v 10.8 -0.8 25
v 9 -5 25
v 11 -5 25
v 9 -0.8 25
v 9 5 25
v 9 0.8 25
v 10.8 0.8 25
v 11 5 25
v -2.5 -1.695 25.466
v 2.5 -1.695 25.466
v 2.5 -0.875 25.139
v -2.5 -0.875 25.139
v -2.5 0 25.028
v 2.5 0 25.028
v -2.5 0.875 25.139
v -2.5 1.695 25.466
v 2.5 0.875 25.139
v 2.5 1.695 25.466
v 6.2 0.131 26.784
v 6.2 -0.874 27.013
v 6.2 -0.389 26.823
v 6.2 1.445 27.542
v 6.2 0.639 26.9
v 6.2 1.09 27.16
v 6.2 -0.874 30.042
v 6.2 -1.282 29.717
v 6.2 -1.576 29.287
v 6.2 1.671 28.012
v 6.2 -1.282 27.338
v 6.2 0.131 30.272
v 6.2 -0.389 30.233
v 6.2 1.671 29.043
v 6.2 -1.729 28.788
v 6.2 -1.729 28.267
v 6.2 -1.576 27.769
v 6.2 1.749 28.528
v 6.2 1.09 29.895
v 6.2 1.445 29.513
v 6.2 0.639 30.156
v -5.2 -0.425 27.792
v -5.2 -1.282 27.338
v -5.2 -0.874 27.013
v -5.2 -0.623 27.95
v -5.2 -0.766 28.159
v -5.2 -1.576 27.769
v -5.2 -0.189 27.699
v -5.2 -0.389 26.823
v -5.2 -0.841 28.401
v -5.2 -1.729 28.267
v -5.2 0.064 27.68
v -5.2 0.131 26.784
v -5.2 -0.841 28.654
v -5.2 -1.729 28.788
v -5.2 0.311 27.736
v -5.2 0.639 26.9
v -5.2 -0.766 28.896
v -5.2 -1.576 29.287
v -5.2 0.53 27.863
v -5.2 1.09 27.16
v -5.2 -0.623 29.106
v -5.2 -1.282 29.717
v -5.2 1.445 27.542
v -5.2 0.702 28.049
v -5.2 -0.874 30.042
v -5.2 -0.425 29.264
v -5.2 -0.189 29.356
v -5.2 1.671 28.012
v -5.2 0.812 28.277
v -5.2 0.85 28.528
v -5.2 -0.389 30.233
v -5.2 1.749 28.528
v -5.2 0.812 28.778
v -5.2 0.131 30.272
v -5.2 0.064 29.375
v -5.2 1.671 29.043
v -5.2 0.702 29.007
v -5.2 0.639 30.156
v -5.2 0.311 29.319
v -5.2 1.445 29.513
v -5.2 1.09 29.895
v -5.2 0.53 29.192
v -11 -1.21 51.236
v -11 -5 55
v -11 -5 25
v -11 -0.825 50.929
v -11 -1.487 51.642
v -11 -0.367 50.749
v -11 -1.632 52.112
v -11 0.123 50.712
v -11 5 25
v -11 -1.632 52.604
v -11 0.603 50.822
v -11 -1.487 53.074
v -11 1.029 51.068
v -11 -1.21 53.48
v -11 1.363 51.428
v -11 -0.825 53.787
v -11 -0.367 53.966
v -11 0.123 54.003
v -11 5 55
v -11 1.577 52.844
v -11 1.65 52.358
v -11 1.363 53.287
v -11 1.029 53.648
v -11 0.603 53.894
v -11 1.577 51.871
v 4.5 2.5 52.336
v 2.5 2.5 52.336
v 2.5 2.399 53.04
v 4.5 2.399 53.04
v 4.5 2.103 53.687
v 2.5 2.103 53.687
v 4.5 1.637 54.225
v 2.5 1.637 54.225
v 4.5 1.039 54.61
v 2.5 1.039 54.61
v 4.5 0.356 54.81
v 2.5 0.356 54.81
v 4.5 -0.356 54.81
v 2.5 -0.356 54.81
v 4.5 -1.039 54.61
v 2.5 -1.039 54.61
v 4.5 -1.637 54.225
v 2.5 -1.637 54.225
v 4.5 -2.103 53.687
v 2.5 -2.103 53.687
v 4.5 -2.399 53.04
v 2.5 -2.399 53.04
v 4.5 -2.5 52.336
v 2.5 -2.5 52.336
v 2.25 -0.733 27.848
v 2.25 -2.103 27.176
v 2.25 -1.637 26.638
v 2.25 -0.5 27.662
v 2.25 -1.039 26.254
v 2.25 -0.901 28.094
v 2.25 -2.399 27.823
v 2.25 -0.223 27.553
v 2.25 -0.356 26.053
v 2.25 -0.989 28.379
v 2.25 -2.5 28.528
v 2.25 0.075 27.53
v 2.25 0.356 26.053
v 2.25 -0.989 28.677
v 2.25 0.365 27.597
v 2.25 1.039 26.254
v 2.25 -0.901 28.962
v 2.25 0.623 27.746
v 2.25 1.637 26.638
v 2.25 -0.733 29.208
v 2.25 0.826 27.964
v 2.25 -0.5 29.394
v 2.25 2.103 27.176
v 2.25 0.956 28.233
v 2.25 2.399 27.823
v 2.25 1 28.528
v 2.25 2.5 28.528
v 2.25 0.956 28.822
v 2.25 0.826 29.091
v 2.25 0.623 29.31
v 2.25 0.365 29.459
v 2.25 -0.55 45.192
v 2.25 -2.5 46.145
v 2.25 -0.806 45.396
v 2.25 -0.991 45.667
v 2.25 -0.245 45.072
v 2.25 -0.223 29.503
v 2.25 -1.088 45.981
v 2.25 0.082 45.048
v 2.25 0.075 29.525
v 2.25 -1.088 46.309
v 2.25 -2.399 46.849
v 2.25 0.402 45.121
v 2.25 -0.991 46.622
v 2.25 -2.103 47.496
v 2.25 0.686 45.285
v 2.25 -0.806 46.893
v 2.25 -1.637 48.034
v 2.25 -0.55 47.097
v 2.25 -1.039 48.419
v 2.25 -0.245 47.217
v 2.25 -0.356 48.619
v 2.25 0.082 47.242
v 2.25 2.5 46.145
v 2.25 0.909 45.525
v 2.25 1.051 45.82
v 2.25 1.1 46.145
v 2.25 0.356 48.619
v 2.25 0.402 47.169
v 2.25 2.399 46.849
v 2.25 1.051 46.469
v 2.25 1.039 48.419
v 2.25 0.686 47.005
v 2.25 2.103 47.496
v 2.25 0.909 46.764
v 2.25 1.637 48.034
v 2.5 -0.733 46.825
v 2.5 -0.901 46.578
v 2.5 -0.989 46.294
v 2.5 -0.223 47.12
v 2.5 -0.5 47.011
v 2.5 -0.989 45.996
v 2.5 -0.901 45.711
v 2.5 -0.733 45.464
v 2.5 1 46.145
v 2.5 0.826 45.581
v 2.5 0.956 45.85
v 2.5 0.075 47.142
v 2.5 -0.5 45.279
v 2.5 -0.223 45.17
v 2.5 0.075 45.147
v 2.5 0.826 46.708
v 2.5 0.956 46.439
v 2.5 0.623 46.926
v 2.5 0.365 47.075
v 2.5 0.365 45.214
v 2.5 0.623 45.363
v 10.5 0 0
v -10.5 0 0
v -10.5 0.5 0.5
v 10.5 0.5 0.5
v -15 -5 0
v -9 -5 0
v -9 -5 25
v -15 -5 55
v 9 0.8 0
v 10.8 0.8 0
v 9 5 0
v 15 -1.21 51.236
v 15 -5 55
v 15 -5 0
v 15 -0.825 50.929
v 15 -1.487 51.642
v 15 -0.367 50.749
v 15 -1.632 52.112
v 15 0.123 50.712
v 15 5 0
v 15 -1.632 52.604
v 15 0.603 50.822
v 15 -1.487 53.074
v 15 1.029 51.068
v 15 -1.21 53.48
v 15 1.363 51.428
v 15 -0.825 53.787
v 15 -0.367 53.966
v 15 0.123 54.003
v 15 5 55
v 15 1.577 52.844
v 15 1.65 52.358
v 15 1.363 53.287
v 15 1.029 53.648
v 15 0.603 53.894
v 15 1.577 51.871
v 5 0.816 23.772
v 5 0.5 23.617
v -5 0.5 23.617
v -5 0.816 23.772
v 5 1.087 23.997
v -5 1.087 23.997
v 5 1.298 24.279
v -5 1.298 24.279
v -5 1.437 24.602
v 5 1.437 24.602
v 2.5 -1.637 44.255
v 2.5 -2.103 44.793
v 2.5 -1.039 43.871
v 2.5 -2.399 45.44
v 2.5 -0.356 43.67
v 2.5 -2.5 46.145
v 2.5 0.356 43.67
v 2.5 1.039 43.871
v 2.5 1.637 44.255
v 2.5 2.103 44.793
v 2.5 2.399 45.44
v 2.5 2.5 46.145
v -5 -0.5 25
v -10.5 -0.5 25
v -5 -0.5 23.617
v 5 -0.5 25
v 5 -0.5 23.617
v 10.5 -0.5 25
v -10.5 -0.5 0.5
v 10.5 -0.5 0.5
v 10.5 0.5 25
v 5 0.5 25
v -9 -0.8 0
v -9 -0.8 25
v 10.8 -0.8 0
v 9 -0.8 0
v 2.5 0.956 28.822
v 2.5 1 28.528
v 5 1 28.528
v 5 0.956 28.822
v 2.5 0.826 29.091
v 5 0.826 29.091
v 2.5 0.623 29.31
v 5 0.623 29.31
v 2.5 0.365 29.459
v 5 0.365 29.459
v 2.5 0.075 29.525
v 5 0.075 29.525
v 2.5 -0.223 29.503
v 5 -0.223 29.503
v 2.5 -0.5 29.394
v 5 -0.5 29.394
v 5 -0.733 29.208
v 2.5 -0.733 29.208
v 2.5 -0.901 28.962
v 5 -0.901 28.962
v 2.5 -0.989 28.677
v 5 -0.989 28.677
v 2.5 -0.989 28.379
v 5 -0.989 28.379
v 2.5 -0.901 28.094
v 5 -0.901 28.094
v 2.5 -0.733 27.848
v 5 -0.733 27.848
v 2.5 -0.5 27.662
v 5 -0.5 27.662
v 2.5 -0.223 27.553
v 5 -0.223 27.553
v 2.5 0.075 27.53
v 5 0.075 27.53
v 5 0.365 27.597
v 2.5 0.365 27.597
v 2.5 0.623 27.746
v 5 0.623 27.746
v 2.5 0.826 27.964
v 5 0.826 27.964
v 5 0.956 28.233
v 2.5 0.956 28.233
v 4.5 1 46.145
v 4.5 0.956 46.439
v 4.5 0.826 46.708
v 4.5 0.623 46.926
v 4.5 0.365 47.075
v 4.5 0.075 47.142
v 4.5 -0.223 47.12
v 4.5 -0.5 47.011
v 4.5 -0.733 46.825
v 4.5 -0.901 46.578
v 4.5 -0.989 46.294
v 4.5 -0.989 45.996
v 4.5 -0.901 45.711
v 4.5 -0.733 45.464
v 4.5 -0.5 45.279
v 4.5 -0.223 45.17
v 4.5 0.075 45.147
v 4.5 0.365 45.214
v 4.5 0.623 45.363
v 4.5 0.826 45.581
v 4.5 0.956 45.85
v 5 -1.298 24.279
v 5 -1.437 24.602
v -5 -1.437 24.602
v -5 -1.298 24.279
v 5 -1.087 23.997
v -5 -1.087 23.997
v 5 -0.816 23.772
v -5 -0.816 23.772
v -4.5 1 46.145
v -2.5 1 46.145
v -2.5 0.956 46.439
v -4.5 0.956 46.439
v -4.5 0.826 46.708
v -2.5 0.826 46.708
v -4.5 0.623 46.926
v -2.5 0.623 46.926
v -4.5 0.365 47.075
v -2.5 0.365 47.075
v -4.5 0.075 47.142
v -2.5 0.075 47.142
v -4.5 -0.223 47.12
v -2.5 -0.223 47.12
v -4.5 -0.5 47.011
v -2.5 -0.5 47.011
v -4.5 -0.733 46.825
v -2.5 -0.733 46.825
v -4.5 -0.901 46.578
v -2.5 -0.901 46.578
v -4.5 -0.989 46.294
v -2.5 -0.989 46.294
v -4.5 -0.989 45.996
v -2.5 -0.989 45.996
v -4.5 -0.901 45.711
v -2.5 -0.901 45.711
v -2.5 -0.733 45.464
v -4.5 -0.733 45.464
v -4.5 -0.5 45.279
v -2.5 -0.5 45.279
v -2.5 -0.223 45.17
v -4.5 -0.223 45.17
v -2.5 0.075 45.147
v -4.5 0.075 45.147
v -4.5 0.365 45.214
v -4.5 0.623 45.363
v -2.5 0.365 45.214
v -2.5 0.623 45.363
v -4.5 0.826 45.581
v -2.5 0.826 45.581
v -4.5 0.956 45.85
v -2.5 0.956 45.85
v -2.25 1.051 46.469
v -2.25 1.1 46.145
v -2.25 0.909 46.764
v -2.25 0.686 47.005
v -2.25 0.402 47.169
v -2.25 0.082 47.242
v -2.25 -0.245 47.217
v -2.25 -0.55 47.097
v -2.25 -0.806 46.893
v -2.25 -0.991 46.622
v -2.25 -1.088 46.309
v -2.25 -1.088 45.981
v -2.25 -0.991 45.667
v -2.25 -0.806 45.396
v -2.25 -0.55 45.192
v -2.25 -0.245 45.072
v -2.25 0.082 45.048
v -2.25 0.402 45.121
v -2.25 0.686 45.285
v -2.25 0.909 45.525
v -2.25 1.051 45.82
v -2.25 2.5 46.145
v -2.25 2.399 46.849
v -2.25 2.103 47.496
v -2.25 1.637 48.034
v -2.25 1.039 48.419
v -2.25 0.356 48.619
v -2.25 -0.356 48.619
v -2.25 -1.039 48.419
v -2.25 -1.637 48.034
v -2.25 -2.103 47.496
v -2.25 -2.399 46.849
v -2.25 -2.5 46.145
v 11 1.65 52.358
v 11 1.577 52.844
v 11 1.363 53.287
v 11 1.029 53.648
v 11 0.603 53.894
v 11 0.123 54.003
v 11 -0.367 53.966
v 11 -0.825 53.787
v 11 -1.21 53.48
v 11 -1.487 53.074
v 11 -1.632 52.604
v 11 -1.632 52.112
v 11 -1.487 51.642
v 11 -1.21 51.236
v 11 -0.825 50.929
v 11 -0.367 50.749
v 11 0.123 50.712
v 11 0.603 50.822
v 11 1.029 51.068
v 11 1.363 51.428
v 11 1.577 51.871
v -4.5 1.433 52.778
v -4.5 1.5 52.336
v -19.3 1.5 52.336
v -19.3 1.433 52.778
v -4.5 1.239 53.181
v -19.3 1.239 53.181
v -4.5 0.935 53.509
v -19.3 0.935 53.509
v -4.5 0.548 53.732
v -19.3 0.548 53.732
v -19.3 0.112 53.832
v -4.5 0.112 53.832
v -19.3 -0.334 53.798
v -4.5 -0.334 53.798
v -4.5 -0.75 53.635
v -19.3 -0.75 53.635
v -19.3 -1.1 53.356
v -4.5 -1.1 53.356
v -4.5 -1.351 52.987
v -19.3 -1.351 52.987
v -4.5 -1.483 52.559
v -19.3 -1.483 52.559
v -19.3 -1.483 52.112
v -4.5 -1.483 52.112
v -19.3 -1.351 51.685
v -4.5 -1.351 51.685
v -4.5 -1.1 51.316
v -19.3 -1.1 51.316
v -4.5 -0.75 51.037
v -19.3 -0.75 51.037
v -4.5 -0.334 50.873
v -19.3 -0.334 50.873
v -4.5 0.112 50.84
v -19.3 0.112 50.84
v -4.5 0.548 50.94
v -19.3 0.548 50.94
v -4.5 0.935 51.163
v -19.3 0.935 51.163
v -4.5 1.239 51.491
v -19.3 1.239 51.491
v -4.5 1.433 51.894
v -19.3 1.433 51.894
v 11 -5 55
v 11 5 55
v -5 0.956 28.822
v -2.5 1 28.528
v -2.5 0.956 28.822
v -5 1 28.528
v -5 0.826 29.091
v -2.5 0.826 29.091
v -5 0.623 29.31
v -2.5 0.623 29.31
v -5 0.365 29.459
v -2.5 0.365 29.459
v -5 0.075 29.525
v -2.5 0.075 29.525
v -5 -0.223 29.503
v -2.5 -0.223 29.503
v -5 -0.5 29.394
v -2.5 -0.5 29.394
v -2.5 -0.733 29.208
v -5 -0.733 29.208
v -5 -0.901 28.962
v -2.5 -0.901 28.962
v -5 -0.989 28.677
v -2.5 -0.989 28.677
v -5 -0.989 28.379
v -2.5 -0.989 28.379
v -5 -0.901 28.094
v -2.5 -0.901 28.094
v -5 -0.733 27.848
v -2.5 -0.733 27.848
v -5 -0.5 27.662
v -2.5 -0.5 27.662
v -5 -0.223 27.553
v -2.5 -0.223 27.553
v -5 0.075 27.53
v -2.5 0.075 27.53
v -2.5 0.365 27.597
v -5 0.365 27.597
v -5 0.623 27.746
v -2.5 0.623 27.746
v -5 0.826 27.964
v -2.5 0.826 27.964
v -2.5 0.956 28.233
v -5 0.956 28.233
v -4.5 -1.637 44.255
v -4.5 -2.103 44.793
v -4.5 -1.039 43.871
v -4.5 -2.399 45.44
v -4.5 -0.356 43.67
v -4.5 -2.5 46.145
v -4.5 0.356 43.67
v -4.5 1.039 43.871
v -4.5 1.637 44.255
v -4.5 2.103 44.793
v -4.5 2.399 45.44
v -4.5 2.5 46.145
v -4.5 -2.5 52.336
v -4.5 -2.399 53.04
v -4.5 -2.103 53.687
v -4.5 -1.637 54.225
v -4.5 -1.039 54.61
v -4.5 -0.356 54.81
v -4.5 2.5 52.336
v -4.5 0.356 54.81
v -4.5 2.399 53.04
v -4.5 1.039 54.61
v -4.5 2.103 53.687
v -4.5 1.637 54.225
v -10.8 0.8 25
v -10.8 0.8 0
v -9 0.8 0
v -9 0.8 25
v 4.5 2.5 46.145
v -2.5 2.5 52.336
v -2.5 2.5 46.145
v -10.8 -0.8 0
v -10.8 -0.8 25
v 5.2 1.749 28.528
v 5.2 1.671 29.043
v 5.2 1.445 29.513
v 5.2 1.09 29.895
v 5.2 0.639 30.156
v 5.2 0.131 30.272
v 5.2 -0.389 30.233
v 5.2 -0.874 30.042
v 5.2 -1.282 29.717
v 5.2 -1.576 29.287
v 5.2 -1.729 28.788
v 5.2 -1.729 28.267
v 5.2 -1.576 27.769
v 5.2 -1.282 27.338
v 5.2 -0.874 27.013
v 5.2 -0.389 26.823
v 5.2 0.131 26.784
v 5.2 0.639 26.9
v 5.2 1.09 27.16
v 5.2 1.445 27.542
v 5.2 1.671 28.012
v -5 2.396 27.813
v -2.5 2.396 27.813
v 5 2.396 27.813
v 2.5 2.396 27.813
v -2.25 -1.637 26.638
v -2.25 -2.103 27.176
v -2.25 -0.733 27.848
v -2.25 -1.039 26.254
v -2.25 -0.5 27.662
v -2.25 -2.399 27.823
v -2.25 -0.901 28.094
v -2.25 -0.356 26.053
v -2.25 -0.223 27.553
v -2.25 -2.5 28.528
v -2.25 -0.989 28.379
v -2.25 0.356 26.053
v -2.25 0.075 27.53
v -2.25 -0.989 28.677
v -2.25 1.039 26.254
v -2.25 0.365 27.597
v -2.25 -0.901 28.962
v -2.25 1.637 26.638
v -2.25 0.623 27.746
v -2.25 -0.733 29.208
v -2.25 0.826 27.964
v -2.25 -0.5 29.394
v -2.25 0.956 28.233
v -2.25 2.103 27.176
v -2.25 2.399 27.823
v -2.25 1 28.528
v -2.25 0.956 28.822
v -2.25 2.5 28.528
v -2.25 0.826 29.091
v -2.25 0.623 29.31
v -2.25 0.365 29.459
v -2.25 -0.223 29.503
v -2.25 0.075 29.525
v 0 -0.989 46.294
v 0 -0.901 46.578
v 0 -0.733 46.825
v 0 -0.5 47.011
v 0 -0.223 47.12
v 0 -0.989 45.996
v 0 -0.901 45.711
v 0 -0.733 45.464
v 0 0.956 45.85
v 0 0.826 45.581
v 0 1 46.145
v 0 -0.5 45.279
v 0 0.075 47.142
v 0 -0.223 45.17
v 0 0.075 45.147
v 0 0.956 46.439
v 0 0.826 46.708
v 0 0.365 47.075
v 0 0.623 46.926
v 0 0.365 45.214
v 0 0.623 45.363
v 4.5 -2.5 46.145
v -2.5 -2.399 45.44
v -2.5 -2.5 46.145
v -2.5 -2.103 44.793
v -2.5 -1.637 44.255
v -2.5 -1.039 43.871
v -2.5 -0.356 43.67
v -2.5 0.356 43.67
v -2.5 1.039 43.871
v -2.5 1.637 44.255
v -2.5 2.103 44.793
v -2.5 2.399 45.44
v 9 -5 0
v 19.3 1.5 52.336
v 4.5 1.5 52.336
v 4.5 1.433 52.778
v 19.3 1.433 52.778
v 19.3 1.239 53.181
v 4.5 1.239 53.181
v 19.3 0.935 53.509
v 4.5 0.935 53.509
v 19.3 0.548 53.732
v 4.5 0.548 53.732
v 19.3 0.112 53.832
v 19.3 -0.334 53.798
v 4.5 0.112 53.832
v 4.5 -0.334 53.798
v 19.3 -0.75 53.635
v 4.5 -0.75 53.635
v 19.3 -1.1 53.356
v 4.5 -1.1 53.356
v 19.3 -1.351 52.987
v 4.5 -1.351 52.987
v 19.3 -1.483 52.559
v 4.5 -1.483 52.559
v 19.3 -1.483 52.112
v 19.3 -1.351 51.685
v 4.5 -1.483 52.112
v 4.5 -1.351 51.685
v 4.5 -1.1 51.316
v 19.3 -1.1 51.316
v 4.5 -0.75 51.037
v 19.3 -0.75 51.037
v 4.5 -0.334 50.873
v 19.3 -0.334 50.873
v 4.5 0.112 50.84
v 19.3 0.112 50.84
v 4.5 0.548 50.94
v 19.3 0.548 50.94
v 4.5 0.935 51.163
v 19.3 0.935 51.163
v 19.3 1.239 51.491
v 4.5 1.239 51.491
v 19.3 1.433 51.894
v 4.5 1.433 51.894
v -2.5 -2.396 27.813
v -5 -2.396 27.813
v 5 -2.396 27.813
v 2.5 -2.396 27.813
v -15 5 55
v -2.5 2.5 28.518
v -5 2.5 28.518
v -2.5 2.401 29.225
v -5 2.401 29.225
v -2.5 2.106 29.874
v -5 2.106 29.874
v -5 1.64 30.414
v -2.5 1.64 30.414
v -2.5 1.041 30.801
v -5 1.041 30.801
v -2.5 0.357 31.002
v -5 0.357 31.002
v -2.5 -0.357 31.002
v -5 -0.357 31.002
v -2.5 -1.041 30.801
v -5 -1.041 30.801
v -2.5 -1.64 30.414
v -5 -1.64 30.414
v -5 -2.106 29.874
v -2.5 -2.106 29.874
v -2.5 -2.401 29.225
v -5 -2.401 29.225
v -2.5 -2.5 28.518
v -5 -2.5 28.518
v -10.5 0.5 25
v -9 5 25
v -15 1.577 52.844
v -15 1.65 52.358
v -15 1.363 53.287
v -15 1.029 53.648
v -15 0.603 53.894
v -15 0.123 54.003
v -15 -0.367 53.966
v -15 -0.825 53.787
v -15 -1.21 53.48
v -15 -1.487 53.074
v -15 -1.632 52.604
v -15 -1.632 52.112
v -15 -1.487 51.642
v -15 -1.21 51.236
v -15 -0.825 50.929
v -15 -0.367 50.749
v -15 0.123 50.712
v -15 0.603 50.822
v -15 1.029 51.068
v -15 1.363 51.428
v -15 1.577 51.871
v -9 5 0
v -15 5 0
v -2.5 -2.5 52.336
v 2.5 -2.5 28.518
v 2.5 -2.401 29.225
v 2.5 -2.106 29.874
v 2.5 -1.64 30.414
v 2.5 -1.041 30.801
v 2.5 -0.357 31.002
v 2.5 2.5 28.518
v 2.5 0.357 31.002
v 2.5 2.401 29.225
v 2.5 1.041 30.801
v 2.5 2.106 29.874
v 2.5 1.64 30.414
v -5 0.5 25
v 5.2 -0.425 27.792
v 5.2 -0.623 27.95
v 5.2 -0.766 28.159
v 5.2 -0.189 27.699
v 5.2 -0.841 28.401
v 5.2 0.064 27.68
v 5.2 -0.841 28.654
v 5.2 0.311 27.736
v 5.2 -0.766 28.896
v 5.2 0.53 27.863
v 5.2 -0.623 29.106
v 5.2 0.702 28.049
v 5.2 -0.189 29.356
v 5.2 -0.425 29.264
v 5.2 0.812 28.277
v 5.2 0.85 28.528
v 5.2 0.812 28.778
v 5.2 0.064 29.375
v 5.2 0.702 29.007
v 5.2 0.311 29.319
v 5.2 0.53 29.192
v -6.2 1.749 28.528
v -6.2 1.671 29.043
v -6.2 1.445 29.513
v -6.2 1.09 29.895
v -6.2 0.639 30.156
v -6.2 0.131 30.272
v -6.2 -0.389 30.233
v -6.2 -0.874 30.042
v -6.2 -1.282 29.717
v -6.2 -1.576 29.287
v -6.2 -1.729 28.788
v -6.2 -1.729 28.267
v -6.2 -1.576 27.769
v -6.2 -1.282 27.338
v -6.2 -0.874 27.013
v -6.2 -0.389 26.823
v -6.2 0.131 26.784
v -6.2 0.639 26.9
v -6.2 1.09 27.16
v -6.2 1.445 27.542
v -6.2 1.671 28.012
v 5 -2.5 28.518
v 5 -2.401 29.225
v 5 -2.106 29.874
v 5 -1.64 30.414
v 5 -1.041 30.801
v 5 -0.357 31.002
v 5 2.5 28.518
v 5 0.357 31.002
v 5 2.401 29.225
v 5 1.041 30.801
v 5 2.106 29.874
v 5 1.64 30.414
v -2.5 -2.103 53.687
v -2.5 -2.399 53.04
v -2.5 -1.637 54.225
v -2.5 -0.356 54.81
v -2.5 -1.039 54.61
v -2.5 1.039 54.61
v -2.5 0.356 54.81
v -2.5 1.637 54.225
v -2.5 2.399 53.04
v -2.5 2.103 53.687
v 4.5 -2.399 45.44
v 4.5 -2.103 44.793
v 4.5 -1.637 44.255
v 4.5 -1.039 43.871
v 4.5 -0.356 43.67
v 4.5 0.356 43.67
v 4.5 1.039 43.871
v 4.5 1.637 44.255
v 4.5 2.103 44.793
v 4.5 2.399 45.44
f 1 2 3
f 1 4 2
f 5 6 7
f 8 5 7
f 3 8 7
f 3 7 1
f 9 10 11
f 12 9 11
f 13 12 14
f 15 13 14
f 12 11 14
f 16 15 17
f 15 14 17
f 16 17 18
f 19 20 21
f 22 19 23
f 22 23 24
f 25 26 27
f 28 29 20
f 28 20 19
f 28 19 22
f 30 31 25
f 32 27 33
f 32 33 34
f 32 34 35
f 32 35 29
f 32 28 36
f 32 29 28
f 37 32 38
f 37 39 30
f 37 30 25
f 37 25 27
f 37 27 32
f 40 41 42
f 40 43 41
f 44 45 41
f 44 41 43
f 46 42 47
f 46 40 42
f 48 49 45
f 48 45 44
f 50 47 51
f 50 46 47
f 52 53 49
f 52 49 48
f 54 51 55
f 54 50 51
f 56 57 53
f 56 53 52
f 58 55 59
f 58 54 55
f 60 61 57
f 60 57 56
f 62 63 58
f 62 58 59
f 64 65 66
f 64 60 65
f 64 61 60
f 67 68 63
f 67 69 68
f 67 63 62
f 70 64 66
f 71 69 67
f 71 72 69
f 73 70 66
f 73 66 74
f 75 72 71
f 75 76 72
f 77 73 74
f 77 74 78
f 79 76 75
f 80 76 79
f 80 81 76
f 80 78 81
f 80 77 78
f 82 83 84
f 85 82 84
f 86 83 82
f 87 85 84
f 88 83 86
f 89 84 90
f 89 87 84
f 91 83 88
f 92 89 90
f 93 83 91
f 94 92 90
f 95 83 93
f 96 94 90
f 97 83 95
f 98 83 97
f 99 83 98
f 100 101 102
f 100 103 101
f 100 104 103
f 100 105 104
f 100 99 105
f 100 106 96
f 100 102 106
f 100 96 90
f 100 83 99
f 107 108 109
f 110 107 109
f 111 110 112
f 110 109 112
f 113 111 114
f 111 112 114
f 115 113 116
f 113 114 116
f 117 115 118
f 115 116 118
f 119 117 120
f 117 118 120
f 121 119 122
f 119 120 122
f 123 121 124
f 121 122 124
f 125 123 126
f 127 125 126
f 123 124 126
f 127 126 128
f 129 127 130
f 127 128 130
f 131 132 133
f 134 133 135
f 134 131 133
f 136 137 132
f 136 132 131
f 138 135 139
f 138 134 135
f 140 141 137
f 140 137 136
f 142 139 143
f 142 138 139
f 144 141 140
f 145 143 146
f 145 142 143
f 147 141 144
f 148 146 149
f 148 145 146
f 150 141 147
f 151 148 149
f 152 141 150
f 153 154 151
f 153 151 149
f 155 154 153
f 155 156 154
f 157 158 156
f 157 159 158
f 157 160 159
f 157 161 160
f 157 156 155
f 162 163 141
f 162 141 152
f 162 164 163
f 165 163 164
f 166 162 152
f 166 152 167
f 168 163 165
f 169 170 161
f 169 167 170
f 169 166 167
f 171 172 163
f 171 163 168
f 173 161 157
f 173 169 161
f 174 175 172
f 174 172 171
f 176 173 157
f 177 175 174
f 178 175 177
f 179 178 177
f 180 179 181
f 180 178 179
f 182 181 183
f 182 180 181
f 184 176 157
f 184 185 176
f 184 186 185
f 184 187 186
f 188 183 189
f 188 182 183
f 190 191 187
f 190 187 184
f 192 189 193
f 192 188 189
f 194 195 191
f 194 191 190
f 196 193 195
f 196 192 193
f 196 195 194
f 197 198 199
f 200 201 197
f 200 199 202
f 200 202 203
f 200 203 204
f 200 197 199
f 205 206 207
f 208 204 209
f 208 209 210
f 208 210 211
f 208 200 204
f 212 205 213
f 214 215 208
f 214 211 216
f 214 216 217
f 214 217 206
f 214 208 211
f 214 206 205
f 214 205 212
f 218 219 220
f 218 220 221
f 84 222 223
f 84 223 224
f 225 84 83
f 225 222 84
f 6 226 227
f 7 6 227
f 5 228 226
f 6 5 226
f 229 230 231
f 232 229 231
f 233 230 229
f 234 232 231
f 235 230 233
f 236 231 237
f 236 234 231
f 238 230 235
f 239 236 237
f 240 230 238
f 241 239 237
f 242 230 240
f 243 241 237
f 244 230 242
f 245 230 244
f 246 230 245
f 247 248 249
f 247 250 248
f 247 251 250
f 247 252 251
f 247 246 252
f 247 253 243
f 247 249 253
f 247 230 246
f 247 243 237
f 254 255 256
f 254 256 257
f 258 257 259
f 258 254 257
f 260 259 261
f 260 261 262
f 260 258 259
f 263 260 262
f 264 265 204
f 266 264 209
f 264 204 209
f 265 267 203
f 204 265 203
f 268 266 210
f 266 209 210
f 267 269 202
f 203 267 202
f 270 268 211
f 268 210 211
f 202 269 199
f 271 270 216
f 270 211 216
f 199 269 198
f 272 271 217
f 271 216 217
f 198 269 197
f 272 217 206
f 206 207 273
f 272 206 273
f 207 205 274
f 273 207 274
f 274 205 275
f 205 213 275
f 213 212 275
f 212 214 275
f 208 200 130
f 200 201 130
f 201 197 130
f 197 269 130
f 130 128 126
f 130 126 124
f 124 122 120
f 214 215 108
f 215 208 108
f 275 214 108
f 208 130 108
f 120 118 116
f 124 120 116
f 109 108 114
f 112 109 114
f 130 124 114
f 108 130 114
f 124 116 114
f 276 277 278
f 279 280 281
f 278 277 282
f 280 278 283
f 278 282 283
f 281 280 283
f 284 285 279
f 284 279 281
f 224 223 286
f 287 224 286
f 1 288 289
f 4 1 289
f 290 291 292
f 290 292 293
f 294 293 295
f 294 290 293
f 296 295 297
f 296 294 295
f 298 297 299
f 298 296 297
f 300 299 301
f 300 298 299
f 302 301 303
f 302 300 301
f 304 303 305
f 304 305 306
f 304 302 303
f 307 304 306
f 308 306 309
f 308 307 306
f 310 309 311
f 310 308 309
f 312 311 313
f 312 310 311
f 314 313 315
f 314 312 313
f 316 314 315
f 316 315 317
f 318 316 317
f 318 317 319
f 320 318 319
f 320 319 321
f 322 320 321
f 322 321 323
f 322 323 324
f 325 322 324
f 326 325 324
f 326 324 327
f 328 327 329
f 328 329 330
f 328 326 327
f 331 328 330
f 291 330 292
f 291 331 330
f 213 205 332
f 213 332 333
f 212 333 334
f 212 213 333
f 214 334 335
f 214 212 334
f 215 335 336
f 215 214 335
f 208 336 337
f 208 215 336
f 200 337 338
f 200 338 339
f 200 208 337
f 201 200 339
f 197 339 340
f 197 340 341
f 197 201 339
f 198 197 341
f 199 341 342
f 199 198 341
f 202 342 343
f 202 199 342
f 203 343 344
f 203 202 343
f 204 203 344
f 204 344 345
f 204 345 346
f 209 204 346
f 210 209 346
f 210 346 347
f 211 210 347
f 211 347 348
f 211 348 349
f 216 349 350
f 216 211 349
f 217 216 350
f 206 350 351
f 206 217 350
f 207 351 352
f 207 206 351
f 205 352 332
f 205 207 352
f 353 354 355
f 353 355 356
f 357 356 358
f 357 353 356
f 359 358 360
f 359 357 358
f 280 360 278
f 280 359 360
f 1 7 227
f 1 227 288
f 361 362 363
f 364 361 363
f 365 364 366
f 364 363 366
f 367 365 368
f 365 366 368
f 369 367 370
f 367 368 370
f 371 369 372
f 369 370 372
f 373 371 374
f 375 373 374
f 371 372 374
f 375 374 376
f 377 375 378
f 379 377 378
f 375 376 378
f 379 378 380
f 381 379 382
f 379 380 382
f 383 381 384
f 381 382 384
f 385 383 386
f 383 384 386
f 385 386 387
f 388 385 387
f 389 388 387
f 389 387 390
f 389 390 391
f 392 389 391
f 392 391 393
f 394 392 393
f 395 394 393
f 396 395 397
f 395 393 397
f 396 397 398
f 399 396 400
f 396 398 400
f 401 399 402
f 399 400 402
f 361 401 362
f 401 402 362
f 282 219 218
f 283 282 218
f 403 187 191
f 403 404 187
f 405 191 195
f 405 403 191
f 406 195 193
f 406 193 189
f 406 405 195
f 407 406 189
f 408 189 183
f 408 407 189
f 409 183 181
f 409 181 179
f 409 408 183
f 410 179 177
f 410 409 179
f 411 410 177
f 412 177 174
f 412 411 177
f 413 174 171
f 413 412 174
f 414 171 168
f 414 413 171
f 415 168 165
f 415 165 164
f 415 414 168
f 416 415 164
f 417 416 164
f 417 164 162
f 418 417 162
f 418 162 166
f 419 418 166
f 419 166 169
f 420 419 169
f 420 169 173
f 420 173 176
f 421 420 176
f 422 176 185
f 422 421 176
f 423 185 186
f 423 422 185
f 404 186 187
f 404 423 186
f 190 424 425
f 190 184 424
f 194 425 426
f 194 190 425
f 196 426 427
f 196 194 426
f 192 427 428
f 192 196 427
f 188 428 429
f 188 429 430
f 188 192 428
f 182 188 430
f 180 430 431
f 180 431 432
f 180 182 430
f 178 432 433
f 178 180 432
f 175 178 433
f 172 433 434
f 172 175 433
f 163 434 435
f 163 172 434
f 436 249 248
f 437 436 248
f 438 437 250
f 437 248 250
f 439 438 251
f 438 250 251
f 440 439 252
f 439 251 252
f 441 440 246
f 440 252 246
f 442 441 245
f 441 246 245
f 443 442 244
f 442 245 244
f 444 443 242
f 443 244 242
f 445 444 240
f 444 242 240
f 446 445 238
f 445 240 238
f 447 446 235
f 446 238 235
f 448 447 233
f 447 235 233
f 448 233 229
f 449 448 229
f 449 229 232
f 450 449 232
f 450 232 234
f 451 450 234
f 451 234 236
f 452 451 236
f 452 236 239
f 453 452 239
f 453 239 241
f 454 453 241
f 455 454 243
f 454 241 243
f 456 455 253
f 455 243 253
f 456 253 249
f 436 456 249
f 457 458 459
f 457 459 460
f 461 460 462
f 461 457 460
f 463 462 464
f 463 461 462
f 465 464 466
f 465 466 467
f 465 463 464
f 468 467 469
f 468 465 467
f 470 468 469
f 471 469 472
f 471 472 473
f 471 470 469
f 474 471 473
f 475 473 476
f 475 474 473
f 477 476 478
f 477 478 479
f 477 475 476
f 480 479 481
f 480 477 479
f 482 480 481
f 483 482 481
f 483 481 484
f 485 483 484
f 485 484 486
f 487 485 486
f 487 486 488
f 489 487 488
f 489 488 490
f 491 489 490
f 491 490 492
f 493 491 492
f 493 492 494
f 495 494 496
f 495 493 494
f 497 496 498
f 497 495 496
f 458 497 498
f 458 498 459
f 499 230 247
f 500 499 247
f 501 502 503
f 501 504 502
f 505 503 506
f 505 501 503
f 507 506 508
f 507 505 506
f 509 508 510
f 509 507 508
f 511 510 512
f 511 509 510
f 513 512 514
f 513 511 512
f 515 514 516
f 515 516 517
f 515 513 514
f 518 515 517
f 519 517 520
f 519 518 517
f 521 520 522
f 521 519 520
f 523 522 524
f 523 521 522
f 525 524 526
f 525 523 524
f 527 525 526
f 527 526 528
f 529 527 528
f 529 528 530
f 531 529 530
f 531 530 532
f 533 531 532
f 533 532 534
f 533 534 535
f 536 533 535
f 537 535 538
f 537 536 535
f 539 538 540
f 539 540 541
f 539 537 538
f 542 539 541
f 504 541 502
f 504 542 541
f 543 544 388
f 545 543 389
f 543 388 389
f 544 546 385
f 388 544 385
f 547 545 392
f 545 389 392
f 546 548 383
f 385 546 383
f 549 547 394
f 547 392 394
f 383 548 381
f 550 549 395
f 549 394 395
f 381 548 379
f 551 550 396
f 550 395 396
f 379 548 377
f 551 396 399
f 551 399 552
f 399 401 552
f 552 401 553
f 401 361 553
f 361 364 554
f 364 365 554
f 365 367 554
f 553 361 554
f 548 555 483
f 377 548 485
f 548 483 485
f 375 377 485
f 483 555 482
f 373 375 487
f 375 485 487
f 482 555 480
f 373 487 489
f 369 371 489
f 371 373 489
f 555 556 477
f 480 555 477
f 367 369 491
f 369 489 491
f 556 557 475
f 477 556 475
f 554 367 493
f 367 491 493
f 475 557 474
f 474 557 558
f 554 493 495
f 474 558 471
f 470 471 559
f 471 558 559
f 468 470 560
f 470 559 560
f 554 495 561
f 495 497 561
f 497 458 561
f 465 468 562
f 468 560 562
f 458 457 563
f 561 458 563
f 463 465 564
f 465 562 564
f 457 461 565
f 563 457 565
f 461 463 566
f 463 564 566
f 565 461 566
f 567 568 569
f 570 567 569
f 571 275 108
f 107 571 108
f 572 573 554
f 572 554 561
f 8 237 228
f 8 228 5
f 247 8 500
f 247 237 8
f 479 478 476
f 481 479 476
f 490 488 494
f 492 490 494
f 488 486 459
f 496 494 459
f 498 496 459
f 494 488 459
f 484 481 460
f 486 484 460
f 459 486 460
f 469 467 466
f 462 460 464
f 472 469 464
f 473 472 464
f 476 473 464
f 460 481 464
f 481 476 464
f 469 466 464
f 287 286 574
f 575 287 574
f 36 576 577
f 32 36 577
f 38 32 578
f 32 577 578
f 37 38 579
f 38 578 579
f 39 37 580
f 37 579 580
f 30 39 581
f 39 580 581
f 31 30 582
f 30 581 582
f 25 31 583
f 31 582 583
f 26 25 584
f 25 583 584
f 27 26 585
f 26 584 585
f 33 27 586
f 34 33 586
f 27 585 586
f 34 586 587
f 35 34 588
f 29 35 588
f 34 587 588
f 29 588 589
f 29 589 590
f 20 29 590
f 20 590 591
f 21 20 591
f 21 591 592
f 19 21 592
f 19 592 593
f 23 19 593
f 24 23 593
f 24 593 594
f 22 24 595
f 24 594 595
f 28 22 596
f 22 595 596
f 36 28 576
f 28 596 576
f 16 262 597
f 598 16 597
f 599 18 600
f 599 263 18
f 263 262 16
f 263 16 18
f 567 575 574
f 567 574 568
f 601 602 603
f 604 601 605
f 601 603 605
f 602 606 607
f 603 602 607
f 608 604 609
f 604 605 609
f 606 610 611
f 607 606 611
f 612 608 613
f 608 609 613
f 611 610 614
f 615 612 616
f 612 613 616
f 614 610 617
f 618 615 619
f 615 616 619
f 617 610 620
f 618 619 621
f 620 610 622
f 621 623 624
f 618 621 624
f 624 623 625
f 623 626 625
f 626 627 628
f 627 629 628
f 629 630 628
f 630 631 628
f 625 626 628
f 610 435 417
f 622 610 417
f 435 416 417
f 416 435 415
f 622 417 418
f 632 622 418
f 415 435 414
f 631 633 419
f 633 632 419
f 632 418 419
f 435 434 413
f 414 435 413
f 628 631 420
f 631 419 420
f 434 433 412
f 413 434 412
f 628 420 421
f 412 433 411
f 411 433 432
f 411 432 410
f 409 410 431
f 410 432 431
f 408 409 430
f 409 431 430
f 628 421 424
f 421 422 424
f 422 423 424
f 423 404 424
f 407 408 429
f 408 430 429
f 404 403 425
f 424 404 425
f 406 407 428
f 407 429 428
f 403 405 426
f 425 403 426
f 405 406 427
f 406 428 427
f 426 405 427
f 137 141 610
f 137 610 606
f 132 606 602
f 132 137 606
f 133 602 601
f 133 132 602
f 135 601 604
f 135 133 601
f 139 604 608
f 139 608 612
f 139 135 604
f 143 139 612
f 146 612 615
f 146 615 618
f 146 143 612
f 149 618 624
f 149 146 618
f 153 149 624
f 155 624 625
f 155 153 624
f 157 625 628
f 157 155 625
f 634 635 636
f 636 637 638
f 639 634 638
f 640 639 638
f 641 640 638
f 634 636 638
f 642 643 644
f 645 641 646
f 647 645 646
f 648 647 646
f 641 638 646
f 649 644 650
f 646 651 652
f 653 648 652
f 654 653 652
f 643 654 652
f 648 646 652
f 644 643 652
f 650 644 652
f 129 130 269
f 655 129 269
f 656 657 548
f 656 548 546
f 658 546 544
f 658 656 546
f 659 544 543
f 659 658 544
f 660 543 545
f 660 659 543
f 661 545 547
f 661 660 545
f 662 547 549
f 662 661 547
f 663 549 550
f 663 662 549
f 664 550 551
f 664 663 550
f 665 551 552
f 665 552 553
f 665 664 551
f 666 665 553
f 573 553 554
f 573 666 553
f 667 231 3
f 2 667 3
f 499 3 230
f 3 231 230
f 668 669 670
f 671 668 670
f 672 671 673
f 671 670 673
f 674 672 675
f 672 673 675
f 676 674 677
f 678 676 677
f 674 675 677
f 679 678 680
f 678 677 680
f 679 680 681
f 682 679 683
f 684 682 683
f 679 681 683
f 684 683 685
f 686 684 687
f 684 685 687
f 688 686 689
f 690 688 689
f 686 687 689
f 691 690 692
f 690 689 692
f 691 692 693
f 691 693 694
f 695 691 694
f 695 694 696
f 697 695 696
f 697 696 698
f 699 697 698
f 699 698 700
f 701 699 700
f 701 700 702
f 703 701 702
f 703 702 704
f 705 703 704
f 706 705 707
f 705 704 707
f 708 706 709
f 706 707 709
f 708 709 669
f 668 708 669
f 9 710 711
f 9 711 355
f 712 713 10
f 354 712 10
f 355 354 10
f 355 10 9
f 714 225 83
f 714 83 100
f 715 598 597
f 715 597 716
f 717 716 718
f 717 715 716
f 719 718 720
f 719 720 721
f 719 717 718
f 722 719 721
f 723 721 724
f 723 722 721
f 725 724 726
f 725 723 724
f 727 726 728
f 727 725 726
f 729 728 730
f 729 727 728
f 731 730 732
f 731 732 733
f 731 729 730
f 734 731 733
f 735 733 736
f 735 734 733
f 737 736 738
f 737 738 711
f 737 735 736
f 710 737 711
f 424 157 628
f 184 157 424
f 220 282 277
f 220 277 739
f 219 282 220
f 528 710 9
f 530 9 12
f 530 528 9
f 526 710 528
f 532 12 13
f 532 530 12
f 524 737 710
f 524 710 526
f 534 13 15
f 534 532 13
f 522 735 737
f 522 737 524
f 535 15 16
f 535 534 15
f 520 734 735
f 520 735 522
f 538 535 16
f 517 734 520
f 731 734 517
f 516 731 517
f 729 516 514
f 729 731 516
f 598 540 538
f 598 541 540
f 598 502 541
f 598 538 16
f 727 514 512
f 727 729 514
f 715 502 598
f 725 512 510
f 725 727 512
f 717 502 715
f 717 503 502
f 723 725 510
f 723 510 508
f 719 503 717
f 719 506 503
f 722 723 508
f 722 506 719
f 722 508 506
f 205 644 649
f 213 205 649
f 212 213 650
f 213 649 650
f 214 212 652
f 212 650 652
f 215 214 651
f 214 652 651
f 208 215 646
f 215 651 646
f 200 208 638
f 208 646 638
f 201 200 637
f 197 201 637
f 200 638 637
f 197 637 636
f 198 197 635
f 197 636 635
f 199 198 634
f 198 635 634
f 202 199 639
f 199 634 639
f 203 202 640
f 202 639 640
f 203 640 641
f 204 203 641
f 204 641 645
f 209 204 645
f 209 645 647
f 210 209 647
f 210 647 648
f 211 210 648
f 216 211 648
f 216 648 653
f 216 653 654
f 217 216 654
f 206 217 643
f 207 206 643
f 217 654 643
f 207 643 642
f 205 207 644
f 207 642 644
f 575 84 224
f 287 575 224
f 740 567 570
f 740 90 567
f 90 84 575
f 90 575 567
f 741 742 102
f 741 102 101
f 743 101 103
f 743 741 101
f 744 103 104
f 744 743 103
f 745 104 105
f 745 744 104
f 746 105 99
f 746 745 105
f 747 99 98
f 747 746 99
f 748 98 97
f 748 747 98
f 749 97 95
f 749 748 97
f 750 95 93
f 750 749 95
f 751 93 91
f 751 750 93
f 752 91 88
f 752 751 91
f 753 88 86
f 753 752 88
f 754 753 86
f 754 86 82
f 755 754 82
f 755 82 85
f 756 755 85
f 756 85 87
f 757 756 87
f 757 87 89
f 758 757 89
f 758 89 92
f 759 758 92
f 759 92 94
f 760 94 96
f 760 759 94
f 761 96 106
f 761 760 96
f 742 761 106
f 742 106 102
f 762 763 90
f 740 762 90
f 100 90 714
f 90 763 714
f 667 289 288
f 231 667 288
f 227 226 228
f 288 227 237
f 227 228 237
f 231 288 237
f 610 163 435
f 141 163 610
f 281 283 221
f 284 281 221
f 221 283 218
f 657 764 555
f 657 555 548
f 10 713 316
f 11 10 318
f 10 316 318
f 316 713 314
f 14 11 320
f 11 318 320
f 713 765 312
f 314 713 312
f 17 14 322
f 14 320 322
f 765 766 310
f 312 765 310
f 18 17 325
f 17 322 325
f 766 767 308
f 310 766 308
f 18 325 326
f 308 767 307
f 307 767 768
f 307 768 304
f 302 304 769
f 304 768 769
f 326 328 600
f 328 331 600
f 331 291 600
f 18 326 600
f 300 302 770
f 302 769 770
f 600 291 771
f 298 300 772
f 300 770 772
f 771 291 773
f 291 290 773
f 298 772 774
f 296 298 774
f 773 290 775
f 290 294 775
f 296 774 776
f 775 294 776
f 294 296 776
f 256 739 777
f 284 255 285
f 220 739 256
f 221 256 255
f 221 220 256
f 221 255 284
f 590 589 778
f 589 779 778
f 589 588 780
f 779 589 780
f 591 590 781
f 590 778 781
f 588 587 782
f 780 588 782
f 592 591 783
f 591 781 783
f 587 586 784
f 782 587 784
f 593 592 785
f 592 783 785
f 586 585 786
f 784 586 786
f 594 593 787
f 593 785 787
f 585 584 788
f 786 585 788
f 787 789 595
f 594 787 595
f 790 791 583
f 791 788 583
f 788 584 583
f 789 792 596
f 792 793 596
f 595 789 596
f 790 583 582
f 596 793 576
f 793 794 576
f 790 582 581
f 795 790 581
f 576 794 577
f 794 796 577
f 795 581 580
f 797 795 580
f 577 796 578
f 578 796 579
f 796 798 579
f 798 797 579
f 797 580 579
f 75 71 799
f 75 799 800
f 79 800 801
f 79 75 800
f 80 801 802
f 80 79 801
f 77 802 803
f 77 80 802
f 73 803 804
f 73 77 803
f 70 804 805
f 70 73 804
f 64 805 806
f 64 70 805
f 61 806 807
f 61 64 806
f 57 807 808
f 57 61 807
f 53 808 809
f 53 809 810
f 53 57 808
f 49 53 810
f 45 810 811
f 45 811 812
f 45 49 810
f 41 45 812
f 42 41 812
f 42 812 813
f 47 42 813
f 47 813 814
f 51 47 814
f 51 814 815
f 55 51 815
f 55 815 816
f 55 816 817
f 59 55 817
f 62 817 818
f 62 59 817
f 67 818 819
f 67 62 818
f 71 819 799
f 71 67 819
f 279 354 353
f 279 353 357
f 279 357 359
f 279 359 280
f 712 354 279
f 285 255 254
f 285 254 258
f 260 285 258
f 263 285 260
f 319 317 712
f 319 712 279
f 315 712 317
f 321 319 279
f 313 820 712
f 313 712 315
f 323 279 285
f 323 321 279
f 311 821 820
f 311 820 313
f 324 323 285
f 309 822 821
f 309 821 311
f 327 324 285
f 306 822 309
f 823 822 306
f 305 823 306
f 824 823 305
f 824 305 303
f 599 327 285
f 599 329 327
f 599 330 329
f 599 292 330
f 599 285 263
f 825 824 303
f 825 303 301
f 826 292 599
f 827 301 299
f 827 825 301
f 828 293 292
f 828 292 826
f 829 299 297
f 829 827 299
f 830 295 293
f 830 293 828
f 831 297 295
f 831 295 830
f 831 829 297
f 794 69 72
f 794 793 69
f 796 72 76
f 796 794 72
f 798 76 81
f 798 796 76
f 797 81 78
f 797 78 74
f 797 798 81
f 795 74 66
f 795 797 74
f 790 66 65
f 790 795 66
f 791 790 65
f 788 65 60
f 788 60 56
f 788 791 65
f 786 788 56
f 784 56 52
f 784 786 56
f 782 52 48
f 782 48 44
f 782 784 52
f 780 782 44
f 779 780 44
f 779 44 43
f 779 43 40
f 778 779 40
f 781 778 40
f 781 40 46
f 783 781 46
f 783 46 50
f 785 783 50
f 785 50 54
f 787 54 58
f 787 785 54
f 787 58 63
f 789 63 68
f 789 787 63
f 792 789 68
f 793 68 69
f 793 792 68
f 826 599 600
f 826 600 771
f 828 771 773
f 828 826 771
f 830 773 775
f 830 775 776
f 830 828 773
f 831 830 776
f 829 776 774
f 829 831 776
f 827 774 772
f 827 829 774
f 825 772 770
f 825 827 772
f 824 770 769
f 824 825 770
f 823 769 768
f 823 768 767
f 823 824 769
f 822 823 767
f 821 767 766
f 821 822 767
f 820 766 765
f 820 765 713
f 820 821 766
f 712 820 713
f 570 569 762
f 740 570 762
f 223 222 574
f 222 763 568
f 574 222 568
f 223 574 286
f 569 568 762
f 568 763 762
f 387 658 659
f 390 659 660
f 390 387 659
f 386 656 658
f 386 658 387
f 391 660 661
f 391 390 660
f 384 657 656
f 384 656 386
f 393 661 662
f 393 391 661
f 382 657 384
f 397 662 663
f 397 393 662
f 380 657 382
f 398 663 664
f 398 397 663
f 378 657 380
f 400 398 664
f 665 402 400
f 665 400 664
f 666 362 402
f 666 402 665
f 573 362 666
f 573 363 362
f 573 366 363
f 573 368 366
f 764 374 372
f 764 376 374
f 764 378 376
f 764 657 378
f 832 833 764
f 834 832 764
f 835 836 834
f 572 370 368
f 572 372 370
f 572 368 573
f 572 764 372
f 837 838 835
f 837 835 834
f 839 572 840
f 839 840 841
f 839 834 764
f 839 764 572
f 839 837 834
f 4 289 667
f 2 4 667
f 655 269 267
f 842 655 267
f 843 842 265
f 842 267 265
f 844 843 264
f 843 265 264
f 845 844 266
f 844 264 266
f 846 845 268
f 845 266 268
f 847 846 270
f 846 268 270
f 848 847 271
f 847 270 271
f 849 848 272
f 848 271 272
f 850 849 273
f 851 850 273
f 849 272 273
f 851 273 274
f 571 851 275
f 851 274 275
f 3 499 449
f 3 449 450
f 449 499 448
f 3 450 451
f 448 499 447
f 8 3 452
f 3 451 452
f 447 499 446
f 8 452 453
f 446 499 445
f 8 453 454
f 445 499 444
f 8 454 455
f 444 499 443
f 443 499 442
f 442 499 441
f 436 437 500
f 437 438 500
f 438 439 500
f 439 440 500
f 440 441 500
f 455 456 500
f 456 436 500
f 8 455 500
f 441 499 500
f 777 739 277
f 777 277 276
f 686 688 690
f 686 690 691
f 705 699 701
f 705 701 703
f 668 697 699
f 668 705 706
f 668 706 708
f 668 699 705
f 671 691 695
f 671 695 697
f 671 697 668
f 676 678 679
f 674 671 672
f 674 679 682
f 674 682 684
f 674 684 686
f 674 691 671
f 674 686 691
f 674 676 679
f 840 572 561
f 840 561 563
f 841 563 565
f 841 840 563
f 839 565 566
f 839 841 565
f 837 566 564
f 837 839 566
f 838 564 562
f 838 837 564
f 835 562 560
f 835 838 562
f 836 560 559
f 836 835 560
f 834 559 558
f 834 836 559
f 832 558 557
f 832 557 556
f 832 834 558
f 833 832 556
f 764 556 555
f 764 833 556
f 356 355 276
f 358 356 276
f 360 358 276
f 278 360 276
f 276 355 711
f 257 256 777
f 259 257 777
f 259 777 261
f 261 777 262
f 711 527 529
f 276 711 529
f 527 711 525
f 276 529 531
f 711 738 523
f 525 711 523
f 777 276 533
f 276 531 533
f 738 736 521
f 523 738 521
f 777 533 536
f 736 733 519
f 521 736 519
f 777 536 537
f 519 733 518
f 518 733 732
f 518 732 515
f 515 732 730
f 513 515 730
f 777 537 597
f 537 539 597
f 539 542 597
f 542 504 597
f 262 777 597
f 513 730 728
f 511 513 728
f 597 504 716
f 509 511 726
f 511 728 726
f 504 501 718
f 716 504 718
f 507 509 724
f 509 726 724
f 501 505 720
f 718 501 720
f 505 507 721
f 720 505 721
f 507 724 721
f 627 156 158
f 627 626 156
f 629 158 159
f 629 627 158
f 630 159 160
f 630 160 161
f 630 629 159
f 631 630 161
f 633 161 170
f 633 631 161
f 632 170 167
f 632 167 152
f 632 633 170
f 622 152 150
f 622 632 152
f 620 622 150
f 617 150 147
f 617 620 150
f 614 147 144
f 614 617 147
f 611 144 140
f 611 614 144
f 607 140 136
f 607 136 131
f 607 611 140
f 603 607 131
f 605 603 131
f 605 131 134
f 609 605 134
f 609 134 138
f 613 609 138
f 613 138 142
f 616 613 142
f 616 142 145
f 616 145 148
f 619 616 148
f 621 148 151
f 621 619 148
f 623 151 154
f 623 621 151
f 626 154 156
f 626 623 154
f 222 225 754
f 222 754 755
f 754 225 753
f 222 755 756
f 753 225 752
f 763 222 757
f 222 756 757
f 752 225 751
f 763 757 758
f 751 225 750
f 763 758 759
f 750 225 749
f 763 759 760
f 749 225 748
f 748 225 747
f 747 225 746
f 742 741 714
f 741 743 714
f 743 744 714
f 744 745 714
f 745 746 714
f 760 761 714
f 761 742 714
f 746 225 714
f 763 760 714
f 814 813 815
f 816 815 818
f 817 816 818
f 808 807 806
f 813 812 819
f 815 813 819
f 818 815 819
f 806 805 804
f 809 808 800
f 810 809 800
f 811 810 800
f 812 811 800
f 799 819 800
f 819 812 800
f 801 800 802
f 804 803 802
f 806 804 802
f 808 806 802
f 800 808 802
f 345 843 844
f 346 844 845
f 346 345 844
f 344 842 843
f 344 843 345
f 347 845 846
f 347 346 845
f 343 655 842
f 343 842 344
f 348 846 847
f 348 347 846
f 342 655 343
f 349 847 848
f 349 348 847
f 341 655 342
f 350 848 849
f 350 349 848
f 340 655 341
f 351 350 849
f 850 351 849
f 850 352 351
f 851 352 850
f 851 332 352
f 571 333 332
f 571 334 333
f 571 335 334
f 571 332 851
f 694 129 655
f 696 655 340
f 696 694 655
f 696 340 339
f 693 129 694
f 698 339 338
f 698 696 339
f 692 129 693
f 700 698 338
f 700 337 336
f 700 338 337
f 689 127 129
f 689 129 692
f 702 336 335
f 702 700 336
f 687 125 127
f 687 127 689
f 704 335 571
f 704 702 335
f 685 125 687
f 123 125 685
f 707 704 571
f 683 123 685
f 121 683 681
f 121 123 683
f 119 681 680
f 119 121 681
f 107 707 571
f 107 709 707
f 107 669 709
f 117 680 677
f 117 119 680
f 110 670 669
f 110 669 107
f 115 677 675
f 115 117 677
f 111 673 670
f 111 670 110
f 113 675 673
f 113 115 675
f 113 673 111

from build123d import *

# Parameters (mm, degrees)
F1_DEPTH  = 25
F0_W      = 21
F0_H      = 1
F2_SIZE   = 0.49999
F3_R      = 1
F4_DEPTH  = 5
F5_R      = 3.5
F5_R_2    = 1
F6_DEPTH  = 2.5
F7_R      = 0.8500000113
F8_DEPTH  = 5.2
F9_R      = 1.7489925994
F10_DEPTH = 1
F12_R     = 1
F12_R_2   = 1.1
F13_DEPTH = 2.25
F14_R     = 1
F15_DEPTH = 2.5
F16_R     = 1
F17_DEPTH = 2
F18_R     = 1.5
F19_DEPTH = 14.8
F21_W     = 10
F21_H     = 30
F21_R     = 1.65
F22_DEPTH = 4


# Not quite as in the source:
# - a fillet or chamfer is up to 0.001 mm smaller than in the source, because OpenCascade refuses the exact size


with BuildPart() as f1:
    # F0 (on Top) → F1 (new body)
    with BuildSketch(Plane.XY):
        Polygon((-9, 5), (-15, 5), (-15, -5), (-9, -5), (-9, -0.8), (-10.8, -0.8), (-10.8, 0.8), (-9, 0.8), align=None)
    extrude(amount=F1_DEPTH)

    # F23: F1b across plane


with BuildPart() as f1b:
    # F0 (on Top) → F1, piece 2 (new body)
    with BuildSketch(Plane.XY):
        Polygon((15, -5), (15, 5), (9, 5), (9, 0.8), (10.8, 0.8), (10.8, -0.8), (9, -0.8), (9, -5), align=None)
    extrude(amount=F1_DEPTH)

    # F21 (on face) → F22 (join)
    with BuildSketch(Plane.YZ.offset(15)):
        with Locations((0, 40)):
            Rectangle(F21_W, F21_H)
        with Locations((0, 52.3577854037)):
            Circle(F21_R, mode=Mode.SUBTRACT)
    extrude(amount=-F22_DEPTH)


with BuildPart() as f1c:
    # F0 (on Top) → F1, piece 3 (new body)
    with BuildSketch(Plane.XY):
        Rectangle(F0_W, F0_H)
    extrude(amount=F1_DEPTH)

    # F2 (size 0.5 in the source; OpenCascade refuses exactly that, so slightly less here)
    f2_edges = [f1c.edges().sort_by_distance(p)[0] for p in [
        (0, -0.5, 0),
        (0, 0.5, 0),
    ]]
    chamfer(f2_edges, length=F2_SIZE)

    # F3 (on Right) → F4 (join, symmetric)
    with BuildSketch(Plane.YZ):
        with BuildLine():
            Line((-2.3955912057, 27.8127531877), (-1.4373557878, 24.6019490366))
            ThreePointArc((-1.4373557878, 24.6019490366), (0, 23.5309109688), (1.4373557878, 24.6019490366))
            Line((1.4373557878, 24.6019490366), (2.3955912057, 27.8127531877))
            ThreePointArc((2.3955912057, 27.8127531877), (0, 31.0276956856), (-2.3955912057, 27.8127531877))
        make_face()
        with Locations((0, 28.5276956856)):
            Circle(F3_R, mode=Mode.SUBTRACT)
    extrude(amount=F4_DEPTH, both=True)

    # F5 (on Right) → F6 (cut, symmetric)
    with BuildSketch(Plane.YZ):
        with Locations((0, 28.5276956856)):
            Circle(F5_R)
        with Locations((0, 28.5276956856)):
            Circle(F5_R_2, mode=Mode.SUBTRACT)
    extrude(amount=F6_DEPTH, both=True, mode=Mode.SUBTRACT)


with BuildPart() as f8:
    # F7 (on Right) → F8 (new body)
    with BuildSketch(Plane.YZ):
        with Locations((0, 28.5276956856)):
            Circle(F7_R)
    extrude(amount=F8_DEPTH)

    # F9 (on face) → F10 (join)
    with BuildSketch(Plane.YZ.offset(5.2)):
        with Locations((0, 28.5276956856)):
            Circle(F9_R)
    extrude(amount=F10_DEPTH)

    # F11: F8 across plane


with BuildPart() as f8_1:
    add(f8.part)
    add(f8.part.mirror(Plane.YZ))


with BuildPart() as f13:
    # F12 (on Right) → F13 (new body, symmetric)
    with BuildSketch(Plane.YZ):
        with BuildLine():
            Line((-2.5, 46.1446046829), (-2.5, 28.5276956856))
            ThreePointArc((-2.5, 28.5276956856), (0, 26.0276956856), (2.5, 28.5276956856))
            Line((2.5, 28.5276956856), (2.5, 46.1446046829))
            ThreePointArc((2.5, 46.1446046829), (0, 48.6446046829), (-2.5, 46.1446046829))
        make_face()
        with Locations((0, 28.5276956856)):
            Circle(F12_R, mode=Mode.SUBTRACT)
        with Locations((0, 46.1446046829)):
            Circle(F12_R_2, mode=Mode.SUBTRACT)
    extrude(amount=F13_DEPTH, both=True)


with BuildPart() as f15:
    # F14 (on Right) → F15 (new body)
    with BuildSketch(Plane.YZ):
        with Locations((0, 46.1446046829)):
            Circle(F14_R)
    extrude(amount=F15_DEPTH)


with BuildPart() as f17:
    # F16 (on face) → F17 (new body)
    with BuildSketch(Plane.YZ.offset(2.5)):
        with BuildLine():
            Line((-2.5, 52.335832268), (-2.5, 46.1446046829))
            ThreePointArc((-2.5, 46.1446046829), (0, 43.6446046829), (2.5, 46.1446046829))
            Line((2.5, 46.1446046829), (2.5, 52.335832268))
            ThreePointArc((2.5, 52.335832268), (0, 54.835832268), (-2.5, 52.335832268))
        make_face()
        with Locations((0, 46.1446046829)):
            Circle(F16_R, mode=Mode.SUBTRACT)
    extrude(amount=F17_DEPTH)

    # F18 (on face) → F19 (join)
    with BuildSketch(Plane.YZ.offset(4.5)):
        with Locations((0, 52.335832268)):
            Circle(F18_R)
    extrude(amount=F19_DEPTH)


with BuildPart() as f20_1:
    # F20: instance of F17
    add(f17.part.mirror(Plane.YZ))


with BuildPart() as f1_1:
    add(f1.part)
    add(f1b.part.mirror(Plane.YZ))


solid = Compound([f1b.part, f1c.part, f8_1.part, f13.part, f15.part, f17.part, f20_1.part, f1_1.part])
